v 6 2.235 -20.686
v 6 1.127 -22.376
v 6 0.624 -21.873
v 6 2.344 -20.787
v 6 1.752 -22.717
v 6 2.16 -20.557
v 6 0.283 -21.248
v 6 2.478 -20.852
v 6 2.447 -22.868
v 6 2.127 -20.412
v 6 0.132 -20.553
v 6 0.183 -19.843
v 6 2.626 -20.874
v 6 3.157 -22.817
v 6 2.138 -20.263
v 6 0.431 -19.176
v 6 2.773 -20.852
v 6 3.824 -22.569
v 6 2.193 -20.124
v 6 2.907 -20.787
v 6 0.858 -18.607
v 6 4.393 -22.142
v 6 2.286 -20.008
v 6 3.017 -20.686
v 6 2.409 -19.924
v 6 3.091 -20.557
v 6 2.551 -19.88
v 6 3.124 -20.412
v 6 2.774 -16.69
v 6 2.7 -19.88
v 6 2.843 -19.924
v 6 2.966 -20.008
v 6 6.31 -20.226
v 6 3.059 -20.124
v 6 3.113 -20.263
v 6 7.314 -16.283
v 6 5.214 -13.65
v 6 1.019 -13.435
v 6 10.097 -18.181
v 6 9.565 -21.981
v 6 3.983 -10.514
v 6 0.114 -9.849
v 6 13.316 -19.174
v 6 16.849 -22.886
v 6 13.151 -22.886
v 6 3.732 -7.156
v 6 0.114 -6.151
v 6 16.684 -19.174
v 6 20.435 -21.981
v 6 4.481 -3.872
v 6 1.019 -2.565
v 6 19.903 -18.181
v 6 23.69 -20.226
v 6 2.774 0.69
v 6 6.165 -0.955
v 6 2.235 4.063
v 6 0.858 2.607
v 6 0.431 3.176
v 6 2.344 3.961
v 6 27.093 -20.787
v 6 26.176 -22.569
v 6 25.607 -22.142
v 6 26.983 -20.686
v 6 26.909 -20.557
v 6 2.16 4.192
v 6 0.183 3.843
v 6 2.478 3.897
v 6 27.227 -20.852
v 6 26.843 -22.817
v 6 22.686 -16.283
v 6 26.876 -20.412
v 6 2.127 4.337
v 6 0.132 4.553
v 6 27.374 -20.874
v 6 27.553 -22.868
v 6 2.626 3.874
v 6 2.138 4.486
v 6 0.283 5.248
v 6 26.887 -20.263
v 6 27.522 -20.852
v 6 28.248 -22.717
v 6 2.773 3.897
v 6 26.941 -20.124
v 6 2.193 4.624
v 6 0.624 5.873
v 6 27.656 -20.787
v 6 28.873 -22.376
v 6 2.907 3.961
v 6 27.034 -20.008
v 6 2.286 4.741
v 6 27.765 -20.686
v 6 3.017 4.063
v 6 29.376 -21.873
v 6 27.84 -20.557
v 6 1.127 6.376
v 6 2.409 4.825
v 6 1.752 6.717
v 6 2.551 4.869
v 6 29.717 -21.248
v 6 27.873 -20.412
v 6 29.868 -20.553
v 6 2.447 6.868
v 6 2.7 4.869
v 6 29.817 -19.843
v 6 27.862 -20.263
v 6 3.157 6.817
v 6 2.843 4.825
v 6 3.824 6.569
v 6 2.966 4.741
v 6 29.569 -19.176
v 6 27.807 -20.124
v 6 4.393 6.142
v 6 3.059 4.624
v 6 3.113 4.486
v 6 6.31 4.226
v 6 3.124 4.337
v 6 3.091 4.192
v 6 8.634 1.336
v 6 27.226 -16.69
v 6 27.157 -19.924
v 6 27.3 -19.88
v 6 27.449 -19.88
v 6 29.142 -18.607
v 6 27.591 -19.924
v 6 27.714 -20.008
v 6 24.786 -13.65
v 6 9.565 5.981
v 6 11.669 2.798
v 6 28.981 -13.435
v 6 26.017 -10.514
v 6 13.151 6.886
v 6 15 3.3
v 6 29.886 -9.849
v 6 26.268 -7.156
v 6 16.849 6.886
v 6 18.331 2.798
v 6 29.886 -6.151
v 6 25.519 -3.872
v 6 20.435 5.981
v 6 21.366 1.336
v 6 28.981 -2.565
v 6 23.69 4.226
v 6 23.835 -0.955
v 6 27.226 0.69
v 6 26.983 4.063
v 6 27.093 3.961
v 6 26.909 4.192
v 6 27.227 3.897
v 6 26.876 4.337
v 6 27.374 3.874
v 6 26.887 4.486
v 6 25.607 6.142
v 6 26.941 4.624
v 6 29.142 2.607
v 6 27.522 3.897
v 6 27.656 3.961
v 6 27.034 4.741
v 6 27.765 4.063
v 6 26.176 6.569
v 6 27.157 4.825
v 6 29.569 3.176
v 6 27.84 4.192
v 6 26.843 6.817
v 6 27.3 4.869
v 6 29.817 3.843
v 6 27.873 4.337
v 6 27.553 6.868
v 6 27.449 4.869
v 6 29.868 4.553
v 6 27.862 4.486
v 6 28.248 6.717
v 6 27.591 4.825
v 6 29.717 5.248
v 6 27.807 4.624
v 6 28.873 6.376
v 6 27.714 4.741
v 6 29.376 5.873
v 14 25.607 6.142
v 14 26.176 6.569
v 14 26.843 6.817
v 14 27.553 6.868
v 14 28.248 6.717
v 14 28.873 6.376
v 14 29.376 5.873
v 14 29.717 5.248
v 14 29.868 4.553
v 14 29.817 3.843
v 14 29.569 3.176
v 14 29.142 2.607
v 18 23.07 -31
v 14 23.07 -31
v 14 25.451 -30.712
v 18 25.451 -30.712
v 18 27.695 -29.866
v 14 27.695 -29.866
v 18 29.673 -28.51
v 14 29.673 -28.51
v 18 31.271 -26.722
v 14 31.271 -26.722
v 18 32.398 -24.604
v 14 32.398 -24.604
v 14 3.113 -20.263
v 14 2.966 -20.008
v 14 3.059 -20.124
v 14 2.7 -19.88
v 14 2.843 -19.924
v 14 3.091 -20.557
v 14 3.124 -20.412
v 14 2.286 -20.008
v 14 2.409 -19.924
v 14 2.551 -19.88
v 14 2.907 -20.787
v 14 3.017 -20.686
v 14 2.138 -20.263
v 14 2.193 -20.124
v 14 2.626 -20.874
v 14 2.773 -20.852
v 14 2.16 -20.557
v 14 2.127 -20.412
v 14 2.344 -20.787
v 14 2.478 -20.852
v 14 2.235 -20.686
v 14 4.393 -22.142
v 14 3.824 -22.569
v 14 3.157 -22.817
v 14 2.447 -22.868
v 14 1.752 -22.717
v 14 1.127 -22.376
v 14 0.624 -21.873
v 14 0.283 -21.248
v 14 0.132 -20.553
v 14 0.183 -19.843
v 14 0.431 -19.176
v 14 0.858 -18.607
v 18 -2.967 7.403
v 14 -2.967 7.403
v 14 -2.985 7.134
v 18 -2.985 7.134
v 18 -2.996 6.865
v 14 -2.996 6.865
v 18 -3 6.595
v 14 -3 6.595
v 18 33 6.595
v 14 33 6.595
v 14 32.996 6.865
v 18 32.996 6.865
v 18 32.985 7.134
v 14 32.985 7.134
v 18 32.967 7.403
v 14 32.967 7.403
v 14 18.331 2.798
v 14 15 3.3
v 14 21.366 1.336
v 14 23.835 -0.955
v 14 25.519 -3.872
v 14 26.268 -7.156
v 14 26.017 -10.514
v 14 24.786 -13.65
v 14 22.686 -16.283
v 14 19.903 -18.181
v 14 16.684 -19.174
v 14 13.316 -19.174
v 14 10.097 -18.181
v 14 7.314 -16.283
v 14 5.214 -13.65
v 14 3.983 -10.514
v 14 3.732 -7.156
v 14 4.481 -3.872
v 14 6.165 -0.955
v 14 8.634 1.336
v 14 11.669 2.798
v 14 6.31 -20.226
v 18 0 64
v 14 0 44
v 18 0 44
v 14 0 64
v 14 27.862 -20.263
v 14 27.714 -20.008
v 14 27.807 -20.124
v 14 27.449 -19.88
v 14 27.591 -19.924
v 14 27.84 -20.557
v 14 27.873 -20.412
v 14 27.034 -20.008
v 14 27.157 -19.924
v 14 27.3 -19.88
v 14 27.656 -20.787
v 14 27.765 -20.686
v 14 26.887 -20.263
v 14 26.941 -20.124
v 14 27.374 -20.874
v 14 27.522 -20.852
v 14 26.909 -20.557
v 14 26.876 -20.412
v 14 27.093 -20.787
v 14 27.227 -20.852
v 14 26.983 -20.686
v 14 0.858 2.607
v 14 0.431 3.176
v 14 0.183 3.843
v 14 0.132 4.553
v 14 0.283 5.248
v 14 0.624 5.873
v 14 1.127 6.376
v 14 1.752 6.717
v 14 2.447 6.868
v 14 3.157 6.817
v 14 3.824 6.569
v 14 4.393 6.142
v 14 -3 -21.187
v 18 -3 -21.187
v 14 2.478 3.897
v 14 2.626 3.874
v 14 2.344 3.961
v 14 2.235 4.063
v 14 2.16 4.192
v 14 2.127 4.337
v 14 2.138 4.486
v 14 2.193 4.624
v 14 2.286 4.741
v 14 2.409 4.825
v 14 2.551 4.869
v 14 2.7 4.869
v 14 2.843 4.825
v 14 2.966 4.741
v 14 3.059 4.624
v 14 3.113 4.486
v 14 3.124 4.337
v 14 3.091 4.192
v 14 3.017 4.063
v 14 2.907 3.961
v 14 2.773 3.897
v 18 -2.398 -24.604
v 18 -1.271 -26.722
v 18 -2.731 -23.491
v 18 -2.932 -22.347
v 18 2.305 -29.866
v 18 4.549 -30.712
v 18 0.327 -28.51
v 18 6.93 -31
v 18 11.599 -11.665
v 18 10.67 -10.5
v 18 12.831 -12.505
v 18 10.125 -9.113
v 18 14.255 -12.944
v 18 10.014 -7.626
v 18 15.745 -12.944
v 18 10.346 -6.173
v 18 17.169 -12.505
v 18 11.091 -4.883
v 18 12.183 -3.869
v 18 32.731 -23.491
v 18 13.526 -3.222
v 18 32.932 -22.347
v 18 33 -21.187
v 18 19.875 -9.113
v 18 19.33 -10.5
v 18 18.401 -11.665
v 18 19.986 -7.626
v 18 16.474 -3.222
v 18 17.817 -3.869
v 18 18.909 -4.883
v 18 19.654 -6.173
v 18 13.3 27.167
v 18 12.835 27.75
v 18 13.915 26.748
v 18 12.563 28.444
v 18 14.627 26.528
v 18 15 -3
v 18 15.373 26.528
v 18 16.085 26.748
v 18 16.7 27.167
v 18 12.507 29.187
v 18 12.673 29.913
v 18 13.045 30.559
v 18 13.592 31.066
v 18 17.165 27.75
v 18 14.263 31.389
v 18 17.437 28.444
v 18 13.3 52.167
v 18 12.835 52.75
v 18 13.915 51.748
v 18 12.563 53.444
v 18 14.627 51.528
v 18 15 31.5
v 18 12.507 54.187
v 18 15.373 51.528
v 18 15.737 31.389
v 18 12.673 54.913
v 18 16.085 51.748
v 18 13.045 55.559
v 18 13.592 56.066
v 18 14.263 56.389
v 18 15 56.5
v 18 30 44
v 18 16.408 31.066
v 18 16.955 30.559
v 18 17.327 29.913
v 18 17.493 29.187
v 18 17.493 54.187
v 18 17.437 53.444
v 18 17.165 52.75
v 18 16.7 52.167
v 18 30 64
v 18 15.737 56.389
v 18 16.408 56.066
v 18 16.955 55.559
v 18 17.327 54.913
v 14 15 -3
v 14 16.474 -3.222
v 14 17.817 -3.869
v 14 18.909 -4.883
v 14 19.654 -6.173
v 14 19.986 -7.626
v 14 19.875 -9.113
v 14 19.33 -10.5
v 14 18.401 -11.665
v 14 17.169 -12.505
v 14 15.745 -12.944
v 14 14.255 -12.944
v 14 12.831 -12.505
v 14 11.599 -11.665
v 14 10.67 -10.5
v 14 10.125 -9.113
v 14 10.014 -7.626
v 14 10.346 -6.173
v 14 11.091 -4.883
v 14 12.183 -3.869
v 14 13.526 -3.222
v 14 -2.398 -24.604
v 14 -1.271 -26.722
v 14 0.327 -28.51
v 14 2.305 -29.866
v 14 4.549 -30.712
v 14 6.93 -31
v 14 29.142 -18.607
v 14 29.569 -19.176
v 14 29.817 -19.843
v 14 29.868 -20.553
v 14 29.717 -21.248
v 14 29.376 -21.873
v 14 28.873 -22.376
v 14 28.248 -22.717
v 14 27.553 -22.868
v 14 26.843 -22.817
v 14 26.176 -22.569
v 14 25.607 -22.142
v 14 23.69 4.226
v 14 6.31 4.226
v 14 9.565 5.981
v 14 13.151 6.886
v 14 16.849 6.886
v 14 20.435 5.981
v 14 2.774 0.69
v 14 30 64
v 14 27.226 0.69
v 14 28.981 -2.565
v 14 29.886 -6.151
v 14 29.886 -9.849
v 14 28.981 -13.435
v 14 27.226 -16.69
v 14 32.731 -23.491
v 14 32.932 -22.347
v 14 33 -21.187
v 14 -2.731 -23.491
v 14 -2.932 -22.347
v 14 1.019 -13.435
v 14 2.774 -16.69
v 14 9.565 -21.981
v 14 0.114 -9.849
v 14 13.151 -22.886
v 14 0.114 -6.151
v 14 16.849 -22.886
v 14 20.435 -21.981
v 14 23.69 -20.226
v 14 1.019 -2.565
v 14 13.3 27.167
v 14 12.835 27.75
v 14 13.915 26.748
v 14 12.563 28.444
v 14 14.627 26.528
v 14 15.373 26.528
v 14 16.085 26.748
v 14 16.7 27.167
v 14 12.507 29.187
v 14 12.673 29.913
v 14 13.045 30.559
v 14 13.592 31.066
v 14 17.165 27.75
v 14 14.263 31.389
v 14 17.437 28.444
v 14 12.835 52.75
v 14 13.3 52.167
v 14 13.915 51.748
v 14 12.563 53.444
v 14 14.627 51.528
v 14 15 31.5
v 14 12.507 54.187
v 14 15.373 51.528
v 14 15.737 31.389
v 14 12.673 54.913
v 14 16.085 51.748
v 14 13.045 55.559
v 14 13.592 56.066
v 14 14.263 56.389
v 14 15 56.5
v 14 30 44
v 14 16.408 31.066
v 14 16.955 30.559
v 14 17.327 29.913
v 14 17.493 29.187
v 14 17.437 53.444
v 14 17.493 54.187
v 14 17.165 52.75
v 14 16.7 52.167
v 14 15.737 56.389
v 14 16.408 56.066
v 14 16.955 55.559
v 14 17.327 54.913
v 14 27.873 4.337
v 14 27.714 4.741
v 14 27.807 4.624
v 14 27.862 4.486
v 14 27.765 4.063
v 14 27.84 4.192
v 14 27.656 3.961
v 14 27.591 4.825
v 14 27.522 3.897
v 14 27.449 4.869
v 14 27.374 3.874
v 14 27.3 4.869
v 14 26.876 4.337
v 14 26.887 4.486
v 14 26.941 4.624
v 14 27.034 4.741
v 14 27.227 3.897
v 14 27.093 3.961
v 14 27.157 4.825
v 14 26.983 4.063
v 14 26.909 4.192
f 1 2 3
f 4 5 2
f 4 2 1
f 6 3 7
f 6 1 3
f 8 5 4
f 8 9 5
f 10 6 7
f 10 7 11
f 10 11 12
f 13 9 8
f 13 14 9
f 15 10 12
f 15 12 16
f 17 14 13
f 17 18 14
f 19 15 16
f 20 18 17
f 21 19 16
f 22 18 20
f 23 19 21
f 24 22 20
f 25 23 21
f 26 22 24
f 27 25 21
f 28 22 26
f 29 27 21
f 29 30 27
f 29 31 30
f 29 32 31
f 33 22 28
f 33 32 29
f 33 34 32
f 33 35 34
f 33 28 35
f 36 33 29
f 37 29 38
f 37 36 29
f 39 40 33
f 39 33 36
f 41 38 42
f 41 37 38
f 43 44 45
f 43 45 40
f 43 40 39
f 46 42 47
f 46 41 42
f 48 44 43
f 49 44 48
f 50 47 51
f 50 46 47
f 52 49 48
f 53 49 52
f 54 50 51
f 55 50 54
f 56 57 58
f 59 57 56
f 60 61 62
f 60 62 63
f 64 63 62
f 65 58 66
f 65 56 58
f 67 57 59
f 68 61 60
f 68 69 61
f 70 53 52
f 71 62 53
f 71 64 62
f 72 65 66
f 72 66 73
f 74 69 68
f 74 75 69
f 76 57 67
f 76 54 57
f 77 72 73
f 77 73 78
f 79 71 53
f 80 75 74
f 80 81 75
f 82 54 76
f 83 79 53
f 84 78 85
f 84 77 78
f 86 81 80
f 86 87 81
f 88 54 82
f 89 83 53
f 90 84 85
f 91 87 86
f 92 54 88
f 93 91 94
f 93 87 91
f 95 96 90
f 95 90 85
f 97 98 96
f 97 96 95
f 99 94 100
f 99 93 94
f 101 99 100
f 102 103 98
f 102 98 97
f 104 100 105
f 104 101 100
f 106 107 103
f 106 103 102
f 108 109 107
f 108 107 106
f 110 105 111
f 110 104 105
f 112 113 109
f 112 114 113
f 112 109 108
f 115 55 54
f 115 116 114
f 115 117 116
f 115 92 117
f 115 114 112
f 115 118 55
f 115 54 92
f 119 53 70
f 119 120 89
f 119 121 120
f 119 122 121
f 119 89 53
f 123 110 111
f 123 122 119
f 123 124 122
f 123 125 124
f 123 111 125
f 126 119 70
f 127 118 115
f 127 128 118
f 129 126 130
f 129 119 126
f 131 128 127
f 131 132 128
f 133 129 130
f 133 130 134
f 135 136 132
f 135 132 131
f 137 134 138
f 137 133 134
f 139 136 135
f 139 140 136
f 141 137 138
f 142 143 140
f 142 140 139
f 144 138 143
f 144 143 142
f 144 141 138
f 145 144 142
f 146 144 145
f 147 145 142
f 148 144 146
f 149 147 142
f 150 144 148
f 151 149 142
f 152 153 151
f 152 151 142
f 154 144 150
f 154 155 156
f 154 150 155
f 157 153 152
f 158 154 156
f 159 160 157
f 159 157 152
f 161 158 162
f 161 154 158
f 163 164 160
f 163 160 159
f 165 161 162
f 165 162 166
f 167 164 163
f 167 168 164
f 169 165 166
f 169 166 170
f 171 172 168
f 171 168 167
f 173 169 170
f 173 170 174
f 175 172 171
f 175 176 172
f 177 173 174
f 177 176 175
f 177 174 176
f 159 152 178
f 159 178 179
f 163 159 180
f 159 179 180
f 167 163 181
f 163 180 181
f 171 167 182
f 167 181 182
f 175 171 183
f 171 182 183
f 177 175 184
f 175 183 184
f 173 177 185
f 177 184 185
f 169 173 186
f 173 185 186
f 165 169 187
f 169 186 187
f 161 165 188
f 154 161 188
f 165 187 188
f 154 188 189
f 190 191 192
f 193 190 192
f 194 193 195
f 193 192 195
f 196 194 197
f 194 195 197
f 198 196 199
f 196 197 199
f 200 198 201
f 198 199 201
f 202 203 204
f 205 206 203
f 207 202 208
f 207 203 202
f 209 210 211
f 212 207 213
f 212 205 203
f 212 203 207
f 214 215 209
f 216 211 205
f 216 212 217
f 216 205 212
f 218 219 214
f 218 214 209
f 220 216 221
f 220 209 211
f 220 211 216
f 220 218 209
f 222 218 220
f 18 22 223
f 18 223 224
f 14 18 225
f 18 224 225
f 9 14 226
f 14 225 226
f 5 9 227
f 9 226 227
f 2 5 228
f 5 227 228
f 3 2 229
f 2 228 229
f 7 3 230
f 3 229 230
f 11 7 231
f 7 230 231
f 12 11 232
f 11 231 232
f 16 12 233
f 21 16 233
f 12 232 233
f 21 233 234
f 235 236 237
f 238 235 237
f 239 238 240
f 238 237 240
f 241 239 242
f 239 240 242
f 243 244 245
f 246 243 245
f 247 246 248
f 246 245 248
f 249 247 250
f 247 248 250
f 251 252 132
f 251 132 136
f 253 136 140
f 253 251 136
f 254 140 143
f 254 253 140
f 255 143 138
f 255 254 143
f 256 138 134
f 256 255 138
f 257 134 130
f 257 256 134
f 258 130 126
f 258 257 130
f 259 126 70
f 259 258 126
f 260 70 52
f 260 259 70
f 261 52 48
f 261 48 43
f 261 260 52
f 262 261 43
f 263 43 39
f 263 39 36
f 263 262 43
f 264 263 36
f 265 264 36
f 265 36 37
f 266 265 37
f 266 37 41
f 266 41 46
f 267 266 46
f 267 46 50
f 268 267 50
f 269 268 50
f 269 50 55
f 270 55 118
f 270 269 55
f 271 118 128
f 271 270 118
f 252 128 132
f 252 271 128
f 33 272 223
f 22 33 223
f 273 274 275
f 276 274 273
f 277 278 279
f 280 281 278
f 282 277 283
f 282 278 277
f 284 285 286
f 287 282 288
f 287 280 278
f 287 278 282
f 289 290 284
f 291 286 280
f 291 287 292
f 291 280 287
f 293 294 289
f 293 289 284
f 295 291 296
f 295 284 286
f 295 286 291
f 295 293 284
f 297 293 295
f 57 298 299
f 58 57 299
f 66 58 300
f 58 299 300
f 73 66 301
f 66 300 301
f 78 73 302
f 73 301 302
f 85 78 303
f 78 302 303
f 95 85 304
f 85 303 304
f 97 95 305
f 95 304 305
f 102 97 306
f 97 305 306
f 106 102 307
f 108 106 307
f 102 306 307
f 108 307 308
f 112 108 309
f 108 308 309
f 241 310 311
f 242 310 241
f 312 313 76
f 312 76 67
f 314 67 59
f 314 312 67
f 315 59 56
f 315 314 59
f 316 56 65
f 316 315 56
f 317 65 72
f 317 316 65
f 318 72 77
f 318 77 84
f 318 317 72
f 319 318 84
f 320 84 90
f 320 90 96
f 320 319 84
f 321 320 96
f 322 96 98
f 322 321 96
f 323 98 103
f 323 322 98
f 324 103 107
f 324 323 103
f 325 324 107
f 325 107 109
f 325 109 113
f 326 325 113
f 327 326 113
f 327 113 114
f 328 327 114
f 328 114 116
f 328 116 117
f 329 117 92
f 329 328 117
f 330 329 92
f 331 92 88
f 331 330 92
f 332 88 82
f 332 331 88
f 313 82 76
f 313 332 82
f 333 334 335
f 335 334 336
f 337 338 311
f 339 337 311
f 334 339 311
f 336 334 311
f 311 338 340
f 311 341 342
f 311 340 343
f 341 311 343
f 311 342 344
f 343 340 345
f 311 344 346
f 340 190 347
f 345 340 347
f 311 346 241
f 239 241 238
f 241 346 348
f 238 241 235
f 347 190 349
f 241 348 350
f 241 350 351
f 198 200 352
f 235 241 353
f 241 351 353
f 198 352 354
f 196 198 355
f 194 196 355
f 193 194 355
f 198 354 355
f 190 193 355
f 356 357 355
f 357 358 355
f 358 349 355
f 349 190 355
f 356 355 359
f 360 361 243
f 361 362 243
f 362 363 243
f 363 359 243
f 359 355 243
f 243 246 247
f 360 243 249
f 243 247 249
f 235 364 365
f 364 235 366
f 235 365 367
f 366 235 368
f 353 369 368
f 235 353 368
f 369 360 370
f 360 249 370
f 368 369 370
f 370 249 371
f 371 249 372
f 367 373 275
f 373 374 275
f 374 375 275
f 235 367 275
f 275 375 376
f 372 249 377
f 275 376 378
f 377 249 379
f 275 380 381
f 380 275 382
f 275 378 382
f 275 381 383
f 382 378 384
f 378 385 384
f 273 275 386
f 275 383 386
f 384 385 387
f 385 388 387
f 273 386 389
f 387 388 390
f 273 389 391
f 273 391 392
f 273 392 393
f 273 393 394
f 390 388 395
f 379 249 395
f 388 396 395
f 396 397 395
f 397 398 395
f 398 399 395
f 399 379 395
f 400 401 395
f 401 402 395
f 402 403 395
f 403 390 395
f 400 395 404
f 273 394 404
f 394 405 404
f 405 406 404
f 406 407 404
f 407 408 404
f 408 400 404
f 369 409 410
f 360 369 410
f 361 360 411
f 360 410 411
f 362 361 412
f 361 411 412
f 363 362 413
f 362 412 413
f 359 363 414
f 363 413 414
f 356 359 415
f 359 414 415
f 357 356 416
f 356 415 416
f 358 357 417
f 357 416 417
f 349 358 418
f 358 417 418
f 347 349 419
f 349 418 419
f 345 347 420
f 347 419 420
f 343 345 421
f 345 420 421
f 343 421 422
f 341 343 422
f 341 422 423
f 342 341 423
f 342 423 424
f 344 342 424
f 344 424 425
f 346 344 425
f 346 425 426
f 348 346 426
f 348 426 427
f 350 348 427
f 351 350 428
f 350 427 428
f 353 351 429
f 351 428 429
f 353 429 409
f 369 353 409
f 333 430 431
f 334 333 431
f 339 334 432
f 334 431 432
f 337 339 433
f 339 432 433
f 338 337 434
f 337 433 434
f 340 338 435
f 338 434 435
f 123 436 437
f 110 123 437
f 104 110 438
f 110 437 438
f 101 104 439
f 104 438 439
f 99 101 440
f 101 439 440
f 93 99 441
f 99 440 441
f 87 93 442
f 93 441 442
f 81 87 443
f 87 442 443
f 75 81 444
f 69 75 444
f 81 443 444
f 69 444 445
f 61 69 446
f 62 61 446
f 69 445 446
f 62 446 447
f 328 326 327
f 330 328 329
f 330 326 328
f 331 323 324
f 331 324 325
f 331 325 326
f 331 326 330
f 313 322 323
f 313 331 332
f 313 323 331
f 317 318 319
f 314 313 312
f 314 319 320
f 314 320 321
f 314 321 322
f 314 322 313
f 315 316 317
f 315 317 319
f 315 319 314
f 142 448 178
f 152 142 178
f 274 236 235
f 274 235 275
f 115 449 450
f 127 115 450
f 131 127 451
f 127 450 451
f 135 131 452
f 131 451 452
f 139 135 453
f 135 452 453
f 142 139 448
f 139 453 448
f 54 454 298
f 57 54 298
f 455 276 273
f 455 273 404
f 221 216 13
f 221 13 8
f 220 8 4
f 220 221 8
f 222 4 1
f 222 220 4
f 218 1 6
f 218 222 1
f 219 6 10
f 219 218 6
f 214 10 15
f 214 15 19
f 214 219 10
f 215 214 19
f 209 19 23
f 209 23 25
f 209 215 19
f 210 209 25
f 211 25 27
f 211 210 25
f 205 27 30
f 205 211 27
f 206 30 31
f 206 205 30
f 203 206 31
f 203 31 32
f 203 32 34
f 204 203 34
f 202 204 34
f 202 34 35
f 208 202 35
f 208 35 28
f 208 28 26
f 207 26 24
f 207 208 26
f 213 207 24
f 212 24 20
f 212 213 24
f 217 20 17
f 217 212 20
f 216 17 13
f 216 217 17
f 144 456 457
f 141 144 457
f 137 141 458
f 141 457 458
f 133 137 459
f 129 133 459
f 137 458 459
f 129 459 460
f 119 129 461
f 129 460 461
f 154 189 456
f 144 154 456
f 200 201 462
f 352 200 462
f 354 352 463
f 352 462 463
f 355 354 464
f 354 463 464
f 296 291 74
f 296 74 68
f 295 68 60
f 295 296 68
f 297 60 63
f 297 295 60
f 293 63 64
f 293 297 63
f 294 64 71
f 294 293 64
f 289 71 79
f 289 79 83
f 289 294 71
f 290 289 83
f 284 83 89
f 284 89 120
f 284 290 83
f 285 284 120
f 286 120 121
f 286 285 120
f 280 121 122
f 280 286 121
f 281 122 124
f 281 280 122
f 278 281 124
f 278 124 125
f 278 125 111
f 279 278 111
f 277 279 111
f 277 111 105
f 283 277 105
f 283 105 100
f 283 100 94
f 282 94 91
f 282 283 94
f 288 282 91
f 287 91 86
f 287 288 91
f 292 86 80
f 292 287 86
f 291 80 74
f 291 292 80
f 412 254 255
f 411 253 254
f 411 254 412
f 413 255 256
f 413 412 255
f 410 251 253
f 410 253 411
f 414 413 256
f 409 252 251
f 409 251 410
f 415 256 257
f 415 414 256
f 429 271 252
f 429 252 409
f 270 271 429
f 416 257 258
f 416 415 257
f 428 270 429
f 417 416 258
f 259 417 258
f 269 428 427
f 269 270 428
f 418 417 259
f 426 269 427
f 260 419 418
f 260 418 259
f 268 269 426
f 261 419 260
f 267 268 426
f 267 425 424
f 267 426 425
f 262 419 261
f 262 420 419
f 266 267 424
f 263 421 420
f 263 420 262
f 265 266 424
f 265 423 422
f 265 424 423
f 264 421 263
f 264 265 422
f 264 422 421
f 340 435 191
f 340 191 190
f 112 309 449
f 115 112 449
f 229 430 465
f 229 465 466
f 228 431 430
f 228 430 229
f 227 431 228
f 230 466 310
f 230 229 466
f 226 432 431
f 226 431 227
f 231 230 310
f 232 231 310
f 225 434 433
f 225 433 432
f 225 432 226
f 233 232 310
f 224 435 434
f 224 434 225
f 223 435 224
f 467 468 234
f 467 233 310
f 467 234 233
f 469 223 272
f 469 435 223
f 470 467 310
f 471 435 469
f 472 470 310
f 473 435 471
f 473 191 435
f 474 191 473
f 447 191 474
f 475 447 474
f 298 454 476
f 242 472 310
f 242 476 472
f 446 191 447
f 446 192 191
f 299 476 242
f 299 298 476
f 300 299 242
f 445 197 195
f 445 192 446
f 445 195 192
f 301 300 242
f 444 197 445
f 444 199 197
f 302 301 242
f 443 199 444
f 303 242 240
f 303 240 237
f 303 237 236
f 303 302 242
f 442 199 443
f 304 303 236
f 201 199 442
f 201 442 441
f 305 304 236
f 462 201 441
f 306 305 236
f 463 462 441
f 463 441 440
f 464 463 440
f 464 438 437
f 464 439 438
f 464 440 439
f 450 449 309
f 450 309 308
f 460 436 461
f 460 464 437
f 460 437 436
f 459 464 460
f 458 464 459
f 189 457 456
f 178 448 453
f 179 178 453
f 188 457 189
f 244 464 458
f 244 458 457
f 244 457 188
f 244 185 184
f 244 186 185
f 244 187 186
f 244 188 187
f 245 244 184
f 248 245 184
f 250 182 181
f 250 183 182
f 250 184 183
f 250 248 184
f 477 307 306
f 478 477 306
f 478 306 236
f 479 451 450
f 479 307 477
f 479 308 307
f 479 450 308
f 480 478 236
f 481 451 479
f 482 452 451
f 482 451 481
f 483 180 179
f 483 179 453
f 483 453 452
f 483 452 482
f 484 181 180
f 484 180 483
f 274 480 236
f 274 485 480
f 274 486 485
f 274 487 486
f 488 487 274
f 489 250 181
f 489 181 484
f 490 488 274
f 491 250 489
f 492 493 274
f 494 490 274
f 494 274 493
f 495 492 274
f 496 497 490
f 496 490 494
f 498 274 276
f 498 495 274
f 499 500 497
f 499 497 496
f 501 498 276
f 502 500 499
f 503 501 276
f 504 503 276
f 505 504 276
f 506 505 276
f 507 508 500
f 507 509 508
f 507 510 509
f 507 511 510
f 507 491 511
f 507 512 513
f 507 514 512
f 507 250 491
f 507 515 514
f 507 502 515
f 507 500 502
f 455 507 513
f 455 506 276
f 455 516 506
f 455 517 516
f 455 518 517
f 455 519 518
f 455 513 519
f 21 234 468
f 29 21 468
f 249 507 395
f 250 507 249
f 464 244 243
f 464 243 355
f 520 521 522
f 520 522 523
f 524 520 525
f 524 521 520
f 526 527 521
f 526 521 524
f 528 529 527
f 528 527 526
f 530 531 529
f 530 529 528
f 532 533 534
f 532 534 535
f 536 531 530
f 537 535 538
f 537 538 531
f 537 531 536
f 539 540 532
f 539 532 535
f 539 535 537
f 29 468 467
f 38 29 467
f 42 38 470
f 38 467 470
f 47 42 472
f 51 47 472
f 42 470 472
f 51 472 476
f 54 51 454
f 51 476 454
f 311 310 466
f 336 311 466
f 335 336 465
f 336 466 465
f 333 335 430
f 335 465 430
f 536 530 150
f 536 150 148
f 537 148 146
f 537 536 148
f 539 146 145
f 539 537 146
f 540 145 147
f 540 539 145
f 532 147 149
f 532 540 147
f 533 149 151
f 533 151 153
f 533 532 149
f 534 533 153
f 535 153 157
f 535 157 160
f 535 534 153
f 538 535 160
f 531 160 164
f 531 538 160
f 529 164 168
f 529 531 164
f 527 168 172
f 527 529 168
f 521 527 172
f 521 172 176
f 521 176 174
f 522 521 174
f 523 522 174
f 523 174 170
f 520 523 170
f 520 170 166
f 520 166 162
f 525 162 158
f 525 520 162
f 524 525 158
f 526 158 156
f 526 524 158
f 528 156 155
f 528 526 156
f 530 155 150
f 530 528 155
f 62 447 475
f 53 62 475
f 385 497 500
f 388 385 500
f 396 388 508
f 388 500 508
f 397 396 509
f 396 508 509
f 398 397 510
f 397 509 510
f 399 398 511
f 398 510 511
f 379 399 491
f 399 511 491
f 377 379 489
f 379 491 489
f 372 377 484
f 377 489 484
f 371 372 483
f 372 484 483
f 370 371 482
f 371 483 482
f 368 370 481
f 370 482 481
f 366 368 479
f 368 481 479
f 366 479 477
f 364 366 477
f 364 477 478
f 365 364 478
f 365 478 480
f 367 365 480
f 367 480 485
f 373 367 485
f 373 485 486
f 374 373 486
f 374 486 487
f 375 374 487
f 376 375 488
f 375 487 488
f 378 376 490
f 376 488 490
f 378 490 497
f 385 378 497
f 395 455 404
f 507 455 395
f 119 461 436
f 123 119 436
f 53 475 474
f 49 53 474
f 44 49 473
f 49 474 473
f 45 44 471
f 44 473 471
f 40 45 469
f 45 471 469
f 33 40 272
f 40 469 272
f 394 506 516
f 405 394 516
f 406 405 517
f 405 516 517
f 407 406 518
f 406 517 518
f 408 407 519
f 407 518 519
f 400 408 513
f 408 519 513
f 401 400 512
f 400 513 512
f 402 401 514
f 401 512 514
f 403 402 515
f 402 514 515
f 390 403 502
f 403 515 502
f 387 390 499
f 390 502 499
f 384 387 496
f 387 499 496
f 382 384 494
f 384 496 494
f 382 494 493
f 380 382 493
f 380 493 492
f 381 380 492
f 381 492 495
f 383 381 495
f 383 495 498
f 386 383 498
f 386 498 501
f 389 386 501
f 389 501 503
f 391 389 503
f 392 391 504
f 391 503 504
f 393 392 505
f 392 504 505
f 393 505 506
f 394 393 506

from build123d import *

# Parameters (mm, degrees)
SKETCH1_W           = 4
SKETCH1_H           = 75
BOSS_EXTRUDE1_DEPTH = 30
SKETCH4_R           = 0.5
SKETCH4_R_2         = 11.3
BOSS_EXTRUDE2_DEPTH = 8
BOSS_EXTRUDE3_DEPTH = 4
FILLET1_R           = 10
SKETCH9_R           = 2.5
SKETCH9_R_2         = 5
CUT_EXTRUDE2_DEPTH  = 4


with BuildPart() as part:
    # Sketch1 → Boss-Extrude1 (new body)
    with BuildSketch(Plane(origin=(0, 0, 0), x_dir=(1, 0, 0), z_dir=(0, 1, 0))):
        with Locations((16, -6.5)):
            Rectangle(SKETCH1_W, SKETCH1_H)
    extrude(amount=BOSS_EXTRUDE1_DEPTH)

    # Sketch4 → Boss-Extrude2 (add)
    with BuildSketch(Plane.ZY.offset(-14)):
        with BuildLine():
            Line((-22.142135624, 25.606601718), (-20.226017285, 23.690483379))
            ThreePointArc((-20.226017285, 23.690483379), (-23, 15), (-20.226017285, 6.309516621))
            Line((-20.226017285, 6.309516621), (-22.142135624, 4.393398282))
            ThreePointArc((-22.142135624, 4.393398282), (-22.142135624, 0.857864376), (-18.606601718, 0.857864376))
            Line((-18.606601718, 0.857864376), (-16.690483379, 2.773982715))
            ThreePointArc((-16.690483379, 2.773982715), (-8, 0), (0.690483379, 2.773982715))
            Line((0.690483379, 2.773982715), (2.606601718, 0.857864376))
            ThreePointArc((2.606601718, 0.857864376), (6.142135624, 0.857864376), (6.142135624, 4.393398282))
            Line((6.142135624, 4.393398282), (4.226017285, 6.309516621))
            ThreePointArc((4.226017285, 6.309516621), (7, 15), (4.226017285, 23.690483379))
            Line((4.226017285, 23.690483379), (6.142135624, 25.606601718))
            ThreePointArc((6.142135624, 25.606601718), (6.142135624, 29.142135624), (2.606601718, 29.142135624))
            Line((2.606601718, 29.142135624), (0.690483379, 27.226017285))
            ThreePointArc((0.690483379, 27.226017285), (-8, 30), (-16.690483379, 27.226017285))
            Line((-16.690483379, 27.226017285), (-18.606601718, 29.142135624))
            ThreePointArc((-18.606601718, 29.142135624), (-22.142135624, 29.142135624), (-22.142135624, 25.606601718))
        make_face()
        with Locations(Location((-20.374368671, 27.374368671, 0), (0, 0, 180))):
            Circle(SKETCH4_R, mode=Mode.SUBTRACT)
        with Locations((-8, 15)):
            Circle(SKETCH4_R_2, mode=Mode.SUBTRACT)
        with Locations(Location((4.374368671, 27.374368671, 0), (0, 0, 180))):
            Circle(SKETCH4_R, mode=Mode.SUBTRACT)
        with Locations(Location((4.374368671, 2.625631329, 0), (0, 0, 180))):
            Circle(SKETCH4_R, mode=Mode.SUBTRACT)
        with Locations(Location((-20.374368671, 2.625631329, 0), (0, 0, 180))):
            Circle(SKETCH4_R, mode=Mode.SUBTRACT)
    extrude(amount=BOSS_EXTRUDE2_DEPTH)

    # Sketch5 → Boss-Extrude3 (add)
    with BuildSketch(Plane.ZY.offset(-14)):
        Polygon((-31, 0), (-23, -3), (7, -3), (44, 0), (64, 0), (64, 30), (44, 30), (7, 33), (-23, 33), (-31, 30), align=None)
    extrude(amount=-BOSS_EXTRUDE3_DEPTH)

    # Fillet1
    # the kernel refuses this fillet: 10 mm, written as the material it takes off along each edge
    with BuildSketch(Plane(origin=(-3.325011704, 30, -31), x_dir=(0, 0.3511234415883908, 0.9363291775690449), z_dir=(1, 0, 0))) as fillet1_piece_1:
        with BuildLine():
            CenterArc((FILLET1_R * 0.693000468165, FILLET1_R), FILLET1_R, 200.55604522, 69.44395478)
            Line((-FILLET1_R * 0.243328709404, FILLET1_R * 0.648876558412), (0, 0))
            Line((0, 0), (FILLET1_R * 0.693000468165, 0))
        make_face()
    extrude(amount=38.650023408, mode=Mode.SUBTRACT)
    with BuildSketch(Plane(origin=(-3.325011704, 0, -31), x_dir=(0, -0.3511234415883923, 0.9363291775690443), z_dir=(1, 0, 0))) as fillet1_piece_2:
        with BuildLine():
            CenterArc((FILLET1_R * 0.693000468165, -FILLET1_R), FILLET1_R, 90, 69.44395478)
            Line((-FILLET1_R * 0.243328709404, -FILLET1_R * 0.648876558412), (0, 0))
            Line((0, 0), (FILLET1_R * 0.693000468165, 0))
        make_face()
    extrude(amount=38.650023408, mode=Mode.SUBTRACT)
    with BuildSketch(Plane(origin=(12.988146779, 33, 7), x_dir=(0, -0.0808158687660647, 0.9967290481146751), z_dir=(1, 0, 0)), Plane(origin=(12.988146779, -3, 7), x_dir=(0, 0, -1), z_dir=(1, 0, 0))) as fillet1_piece_3:
        with BuildLine():
            CenterArc((FILLET1_R * 0.0404741288471, FILLET1_R), FILLET1_R, 265.364536573, 4.635463427)
            Line((-FILLET1_R * 0.040341739919, FILLET1_R * 0.00327095188532), (0, 0))
            Line((0, 0), (FILLET1_R * 0.0404741288471, 0))
        make_face()
    extrude(amount=6.023706442, mode=Mode.SUBTRACT)
    with BuildSketch(Plane(origin=(9.466635456, 33, -23), x_dir=(0, 0, 1), z_dir=(1, 0, 0)), Plane(origin=(9.466635456, -3, -23), x_dir=(0, 0.35112344158839215, -0.9363291775690443), z_dir=(1, 0, 0))) as fillet1_piece_4:
        with BuildLine():
            CenterArc((FILLET1_R * 0.181334581773, FILLET1_R), FILLET1_R, 249.44395478, 20.55604522)
            Line((-FILLET1_R * 0.169788859816, FILLET1_R * 0.063670822431), (0, 0))
            Line((0, 0), (FILLET1_R * 0.181334581773, 0))
        make_face()
    extrude(amount=13.066729089, mode=Mode.SUBTRACT)

    # Sketch9 → Cut-Extrude2 (cut)
    with BuildSketch(Plane.ZY.offset(-14)):
        with Locations((54, 15)):
            Circle(SKETCH9_R)
        with Locations((29, 15)):
            Circle(SKETCH9_R)
        with Locations((-8, 15)):
            Circle(SKETCH9_R_2)
    extrude(amount=-CUT_EXTRUDE2_DEPTH, mode=Mode.SUBTRACT)


solid = part.part
